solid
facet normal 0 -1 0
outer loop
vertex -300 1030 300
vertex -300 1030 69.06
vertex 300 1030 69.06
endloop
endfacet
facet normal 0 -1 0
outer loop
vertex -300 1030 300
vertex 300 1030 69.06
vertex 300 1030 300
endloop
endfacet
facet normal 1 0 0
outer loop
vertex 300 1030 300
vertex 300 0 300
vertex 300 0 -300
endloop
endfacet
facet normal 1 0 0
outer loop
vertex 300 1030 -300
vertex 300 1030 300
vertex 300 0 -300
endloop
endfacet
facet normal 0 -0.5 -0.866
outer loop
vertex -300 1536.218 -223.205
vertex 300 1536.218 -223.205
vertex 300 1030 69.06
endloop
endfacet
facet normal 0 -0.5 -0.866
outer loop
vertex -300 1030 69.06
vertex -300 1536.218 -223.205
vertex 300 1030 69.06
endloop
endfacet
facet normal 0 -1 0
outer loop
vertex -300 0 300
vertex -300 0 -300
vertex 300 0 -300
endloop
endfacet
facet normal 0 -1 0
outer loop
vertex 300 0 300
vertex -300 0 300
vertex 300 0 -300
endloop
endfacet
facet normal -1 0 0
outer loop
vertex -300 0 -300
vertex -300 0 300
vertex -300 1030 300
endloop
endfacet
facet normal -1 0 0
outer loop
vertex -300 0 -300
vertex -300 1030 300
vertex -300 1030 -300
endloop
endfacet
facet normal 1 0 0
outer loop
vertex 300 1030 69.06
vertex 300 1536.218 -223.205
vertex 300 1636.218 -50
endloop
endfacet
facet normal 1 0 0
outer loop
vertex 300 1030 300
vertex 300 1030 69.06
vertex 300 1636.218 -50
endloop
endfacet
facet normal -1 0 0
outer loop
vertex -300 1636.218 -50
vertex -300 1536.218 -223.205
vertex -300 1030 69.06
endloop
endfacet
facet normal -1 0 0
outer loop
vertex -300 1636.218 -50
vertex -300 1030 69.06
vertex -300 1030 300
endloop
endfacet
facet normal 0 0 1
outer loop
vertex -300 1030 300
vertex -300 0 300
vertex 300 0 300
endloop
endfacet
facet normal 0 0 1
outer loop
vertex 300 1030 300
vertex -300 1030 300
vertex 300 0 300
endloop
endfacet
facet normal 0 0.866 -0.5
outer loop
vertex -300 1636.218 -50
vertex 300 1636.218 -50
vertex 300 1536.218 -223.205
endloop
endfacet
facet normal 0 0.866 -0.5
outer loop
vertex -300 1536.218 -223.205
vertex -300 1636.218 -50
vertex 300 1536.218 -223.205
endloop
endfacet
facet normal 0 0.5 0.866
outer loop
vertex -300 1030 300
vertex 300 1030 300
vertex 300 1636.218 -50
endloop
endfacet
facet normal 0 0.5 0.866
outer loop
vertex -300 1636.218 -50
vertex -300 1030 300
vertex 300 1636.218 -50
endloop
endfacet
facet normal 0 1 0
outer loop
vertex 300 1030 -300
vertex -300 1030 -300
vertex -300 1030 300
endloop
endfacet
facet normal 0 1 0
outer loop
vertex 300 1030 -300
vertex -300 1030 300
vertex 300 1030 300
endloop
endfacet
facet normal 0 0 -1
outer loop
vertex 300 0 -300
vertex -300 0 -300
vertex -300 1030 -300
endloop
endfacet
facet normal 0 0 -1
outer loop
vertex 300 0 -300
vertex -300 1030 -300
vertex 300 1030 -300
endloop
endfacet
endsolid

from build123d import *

# Parameters (mm, degrees)
SKETCH_1_W      = 600
SKETCH_1_H      = 600
EXTRUDE_1_DEPTH = 1030
EXTRUDE_2_DEPTH = 600


with BuildPart() as part:
    # 草图1 → 拉伸1 (new body)
    with BuildSketch(Plane(origin=(0, 0, 0), x_dir=(1, 0, 0), z_dir=(0, 1, 0))):
        Rectangle(SKETCH_1_W, SKETCH_1_H)
    extrude(amount=EXTRUDE_1_DEPTH)


with BuildPart() as body_2:
    # 草图4 → 拉伸2 (new body)
    with BuildSketch(Plane(origin=(300, 0, 0), x_dir=(0, 0, -1), z_dir=(1, 0, 0))):
        Polygon((-300, 1030), (50, 1636.217782649), (223.205080757, 1536.217782649), (-69.059892324, 1030), align=None)
    extrude(amount=-EXTRUDE_2_DEPTH)


solid = Compound([part.part, body_2.part])
